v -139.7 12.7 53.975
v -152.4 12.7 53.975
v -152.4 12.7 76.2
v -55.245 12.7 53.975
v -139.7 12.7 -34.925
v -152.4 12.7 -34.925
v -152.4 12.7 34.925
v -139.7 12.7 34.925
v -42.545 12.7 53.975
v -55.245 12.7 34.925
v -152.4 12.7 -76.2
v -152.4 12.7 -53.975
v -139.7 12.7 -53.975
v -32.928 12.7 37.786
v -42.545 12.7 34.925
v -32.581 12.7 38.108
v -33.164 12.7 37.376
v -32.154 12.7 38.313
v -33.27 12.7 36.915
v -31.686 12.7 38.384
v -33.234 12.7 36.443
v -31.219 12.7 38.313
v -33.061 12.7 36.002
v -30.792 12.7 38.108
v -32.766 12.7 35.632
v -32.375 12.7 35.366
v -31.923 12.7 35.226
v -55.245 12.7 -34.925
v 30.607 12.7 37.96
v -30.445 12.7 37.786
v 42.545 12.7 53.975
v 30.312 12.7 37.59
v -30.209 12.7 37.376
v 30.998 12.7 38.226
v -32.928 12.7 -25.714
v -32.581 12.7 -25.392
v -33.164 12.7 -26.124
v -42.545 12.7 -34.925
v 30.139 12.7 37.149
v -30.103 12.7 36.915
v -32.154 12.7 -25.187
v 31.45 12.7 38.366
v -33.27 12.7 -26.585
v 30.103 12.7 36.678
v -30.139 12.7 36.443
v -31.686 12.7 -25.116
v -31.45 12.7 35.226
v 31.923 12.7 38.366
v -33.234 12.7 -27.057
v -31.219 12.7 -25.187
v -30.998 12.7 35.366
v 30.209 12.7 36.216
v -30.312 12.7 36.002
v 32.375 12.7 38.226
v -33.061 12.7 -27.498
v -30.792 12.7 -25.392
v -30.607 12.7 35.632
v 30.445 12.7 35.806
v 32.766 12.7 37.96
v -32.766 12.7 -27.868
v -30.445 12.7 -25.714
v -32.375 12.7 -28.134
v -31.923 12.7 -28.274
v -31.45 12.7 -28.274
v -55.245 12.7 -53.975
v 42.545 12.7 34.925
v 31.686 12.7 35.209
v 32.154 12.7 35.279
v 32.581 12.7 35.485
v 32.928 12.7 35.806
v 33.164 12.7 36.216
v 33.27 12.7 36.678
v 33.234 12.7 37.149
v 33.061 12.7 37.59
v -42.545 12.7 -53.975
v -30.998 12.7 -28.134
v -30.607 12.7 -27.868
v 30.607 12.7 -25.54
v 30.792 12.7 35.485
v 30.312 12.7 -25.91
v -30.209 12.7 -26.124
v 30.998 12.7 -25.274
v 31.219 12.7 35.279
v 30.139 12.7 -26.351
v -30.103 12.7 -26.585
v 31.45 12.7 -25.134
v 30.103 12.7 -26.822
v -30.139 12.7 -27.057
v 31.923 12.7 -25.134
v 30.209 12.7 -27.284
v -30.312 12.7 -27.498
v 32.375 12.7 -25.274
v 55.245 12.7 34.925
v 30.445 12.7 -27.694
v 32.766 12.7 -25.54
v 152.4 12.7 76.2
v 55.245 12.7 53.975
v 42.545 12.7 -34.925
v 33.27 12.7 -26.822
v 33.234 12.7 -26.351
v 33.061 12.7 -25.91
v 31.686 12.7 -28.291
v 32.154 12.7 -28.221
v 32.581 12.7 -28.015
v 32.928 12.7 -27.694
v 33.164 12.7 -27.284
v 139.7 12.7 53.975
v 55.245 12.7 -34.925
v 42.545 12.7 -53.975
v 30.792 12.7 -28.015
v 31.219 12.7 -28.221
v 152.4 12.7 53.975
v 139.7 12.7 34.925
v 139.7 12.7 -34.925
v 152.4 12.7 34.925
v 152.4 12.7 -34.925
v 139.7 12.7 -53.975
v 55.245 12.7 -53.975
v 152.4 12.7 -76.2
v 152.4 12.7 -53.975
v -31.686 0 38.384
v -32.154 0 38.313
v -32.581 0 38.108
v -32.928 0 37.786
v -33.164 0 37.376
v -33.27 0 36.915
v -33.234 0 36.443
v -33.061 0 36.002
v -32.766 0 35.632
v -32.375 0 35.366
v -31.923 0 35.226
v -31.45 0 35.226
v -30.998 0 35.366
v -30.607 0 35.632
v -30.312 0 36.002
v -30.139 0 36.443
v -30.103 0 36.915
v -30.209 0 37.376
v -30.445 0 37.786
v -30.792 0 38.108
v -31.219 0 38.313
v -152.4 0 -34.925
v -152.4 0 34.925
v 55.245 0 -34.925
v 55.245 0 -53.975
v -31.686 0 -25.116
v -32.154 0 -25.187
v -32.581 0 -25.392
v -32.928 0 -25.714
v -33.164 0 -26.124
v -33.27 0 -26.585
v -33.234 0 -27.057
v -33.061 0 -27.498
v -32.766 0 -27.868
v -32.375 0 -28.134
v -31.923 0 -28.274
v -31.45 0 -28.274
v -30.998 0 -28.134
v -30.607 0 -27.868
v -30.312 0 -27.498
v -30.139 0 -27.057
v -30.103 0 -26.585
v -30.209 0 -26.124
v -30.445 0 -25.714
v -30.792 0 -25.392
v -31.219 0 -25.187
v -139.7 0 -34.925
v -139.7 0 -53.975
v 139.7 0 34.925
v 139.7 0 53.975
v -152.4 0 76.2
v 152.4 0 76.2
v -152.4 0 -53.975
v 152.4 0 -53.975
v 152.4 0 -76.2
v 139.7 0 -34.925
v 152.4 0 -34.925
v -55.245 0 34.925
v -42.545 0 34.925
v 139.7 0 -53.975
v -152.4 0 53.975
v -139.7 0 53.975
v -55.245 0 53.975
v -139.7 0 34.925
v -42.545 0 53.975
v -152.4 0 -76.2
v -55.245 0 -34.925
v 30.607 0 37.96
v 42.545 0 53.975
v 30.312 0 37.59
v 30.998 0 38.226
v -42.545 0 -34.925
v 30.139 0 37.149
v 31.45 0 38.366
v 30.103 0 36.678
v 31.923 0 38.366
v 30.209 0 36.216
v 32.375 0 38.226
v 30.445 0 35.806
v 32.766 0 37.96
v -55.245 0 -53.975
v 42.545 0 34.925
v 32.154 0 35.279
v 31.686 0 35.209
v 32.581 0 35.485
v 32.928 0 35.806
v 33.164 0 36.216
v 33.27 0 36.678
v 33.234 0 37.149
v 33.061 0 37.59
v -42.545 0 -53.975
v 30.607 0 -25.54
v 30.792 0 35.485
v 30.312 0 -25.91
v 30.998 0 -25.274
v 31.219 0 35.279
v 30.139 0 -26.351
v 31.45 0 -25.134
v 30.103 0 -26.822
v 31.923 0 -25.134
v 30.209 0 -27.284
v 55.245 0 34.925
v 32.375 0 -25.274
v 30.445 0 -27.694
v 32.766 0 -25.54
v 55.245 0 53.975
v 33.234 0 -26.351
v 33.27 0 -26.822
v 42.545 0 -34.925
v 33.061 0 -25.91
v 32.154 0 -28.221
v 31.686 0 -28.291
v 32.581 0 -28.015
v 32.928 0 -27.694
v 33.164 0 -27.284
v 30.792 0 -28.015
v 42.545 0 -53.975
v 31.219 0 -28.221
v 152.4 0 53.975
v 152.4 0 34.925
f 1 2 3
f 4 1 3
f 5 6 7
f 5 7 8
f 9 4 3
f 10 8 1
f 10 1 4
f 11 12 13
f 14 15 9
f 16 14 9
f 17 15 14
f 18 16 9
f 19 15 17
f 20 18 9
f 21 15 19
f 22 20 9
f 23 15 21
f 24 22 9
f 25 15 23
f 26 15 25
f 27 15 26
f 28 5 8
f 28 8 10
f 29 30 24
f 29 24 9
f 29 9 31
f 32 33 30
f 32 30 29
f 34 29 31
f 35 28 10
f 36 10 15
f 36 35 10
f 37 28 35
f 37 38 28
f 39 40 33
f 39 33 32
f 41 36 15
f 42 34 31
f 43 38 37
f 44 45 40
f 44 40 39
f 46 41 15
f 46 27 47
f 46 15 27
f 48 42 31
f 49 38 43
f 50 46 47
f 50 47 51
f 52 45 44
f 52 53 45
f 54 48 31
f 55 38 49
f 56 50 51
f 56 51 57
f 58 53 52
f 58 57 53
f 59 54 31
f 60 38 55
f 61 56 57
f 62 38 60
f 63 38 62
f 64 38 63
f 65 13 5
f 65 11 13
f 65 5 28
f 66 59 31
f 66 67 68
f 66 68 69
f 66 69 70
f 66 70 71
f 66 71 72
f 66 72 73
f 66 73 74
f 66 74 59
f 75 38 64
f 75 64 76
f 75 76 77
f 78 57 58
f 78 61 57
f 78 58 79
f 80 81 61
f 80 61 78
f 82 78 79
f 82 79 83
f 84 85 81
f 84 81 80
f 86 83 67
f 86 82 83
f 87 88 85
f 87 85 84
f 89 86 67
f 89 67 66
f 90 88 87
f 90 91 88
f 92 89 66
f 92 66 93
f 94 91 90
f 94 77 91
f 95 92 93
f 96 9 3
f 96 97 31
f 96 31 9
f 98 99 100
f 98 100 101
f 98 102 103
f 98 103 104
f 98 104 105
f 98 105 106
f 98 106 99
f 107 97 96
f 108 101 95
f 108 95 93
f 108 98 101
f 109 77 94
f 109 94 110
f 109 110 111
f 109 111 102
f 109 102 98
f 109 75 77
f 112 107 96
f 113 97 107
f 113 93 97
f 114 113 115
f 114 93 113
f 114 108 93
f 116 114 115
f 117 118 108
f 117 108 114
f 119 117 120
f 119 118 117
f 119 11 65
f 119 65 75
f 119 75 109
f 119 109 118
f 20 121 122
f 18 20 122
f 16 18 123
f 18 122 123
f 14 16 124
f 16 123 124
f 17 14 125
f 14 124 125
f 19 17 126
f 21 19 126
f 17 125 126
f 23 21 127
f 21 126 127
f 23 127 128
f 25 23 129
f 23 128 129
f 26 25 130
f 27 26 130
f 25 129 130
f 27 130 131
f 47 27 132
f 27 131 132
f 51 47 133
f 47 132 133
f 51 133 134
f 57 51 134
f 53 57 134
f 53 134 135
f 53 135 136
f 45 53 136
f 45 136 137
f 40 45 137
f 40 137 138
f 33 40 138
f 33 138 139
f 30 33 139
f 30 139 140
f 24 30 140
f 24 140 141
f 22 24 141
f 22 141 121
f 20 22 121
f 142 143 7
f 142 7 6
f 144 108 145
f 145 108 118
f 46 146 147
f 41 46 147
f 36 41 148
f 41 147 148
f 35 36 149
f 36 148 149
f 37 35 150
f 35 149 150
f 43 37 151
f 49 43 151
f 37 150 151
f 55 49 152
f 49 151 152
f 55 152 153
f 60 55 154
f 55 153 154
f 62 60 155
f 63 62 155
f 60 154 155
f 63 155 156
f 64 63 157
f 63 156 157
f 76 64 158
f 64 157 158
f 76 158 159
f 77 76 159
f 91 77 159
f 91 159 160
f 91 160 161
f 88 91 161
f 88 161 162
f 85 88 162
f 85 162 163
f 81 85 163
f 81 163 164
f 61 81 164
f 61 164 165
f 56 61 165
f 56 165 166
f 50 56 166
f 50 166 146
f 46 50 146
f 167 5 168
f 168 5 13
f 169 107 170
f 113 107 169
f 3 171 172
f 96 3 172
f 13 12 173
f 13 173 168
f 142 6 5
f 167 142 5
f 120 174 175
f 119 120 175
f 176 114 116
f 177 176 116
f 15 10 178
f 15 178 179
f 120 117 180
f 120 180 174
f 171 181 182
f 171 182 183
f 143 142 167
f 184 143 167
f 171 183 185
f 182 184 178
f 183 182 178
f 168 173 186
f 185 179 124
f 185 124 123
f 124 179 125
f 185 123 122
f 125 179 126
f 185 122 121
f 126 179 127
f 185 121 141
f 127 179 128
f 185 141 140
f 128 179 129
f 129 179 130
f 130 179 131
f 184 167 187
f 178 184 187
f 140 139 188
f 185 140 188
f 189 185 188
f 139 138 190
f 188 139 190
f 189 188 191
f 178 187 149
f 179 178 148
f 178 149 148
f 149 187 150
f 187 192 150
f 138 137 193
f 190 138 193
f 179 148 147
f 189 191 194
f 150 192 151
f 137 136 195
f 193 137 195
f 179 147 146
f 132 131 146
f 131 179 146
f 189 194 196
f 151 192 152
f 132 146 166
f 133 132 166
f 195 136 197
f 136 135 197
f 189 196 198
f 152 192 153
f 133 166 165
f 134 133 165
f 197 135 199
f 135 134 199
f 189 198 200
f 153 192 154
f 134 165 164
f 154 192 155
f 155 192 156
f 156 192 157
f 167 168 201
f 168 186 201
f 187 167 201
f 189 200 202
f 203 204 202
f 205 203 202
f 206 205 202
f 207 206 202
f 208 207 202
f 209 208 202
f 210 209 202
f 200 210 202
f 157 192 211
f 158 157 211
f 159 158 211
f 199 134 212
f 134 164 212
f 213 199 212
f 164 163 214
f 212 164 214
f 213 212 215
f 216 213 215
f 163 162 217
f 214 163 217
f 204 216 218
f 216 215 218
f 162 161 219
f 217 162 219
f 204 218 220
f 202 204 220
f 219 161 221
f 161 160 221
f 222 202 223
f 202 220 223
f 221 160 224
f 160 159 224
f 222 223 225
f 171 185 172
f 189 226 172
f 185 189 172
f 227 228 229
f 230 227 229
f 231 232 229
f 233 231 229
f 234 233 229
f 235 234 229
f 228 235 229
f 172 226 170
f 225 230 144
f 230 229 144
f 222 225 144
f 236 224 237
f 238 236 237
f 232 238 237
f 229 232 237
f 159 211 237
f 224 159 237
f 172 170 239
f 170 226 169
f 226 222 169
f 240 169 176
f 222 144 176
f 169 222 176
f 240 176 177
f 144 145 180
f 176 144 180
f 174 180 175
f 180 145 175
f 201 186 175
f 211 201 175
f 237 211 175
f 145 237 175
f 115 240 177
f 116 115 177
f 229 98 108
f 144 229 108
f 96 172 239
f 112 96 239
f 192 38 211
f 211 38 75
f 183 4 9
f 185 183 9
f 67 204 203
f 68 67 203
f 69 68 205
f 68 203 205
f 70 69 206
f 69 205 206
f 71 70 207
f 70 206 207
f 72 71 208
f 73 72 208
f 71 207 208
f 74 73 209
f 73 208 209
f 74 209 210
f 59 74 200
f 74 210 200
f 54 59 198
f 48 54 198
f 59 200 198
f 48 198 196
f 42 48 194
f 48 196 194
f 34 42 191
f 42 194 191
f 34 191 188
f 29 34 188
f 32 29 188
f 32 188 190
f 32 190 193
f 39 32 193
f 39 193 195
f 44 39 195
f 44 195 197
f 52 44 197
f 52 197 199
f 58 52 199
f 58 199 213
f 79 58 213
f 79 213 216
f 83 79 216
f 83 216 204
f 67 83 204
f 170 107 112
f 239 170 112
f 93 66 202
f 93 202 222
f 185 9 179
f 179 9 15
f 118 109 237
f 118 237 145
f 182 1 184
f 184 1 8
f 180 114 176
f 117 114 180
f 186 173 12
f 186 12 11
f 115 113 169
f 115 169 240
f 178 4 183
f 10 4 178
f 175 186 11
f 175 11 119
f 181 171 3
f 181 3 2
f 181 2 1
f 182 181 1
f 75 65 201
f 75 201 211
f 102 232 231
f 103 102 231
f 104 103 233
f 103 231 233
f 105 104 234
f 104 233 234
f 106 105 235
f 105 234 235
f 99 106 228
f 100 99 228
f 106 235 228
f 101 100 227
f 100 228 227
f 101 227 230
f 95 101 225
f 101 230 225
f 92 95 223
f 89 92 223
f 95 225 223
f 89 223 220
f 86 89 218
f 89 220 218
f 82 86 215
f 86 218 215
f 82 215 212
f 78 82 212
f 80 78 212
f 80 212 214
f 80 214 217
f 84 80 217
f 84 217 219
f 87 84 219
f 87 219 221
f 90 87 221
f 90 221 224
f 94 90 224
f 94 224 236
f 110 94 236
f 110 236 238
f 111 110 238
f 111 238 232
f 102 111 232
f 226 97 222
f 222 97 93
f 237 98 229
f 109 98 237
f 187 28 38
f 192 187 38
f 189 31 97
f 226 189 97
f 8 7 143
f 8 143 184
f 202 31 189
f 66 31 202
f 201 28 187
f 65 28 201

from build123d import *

# Parameters (mm, degrees)
SKETCH1_W          = 304.8
SKETCH1_H          = 152.4
EXTRUDE1_DEPTH     = 12.7
SKETCH2_W          = 12.7
SKETCH2_H          = 19.05
EXTRUDE2_DEPTH     = 171.861025398
SKETCH3_R          = 1.5875
CUT_EXTRUDE1_DEPTH = 171.861025398


with BuildPart() as part:
    # Sketch1 → Extrude1 (new body)
    with BuildSketch(Plane(origin=(0, 0, 0), x_dir=(1, 0, 0), z_dir=(0, 1, 0))):
        Rectangle(SKETCH1_W, SKETCH1_H)
    extrude(amount=EXTRUDE1_DEPTH)

    # Sketch2 → Extrude2 (cut, through all)
    with BuildSketch(Plane(origin=(0, 12.7, 0), x_dir=(1, 0, 0), z_dir=(0, 1, 0))):
        with Locations((-48.895, 44.45)):
            Rectangle(SKETCH2_W, SKETCH2_H)
        with Locations((48.895, 44.45)):
            Rectangle(SKETCH2_W, SKETCH2_H)
        with Locations((-48.895, -44.45)):
            Rectangle(SKETCH2_W, SKETCH2_H)
        with Locations((48.895, -44.45)):
            Rectangle(SKETCH2_W, SKETCH2_H)
        with Locations((146.05, 44.45)):
            Rectangle(SKETCH2_W, SKETCH2_H)
        with Locations((-146.05, 44.45)):
            Rectangle(SKETCH2_W, SKETCH2_H)
        with Locations((146.05, -44.45)):
            Rectangle(SKETCH2_W, SKETCH2_H)
        with Locations((-146.05, -44.45)):
            Rectangle(SKETCH2_W, SKETCH2_H)
    extrude(amount=-EXTRUDE2_DEPTH, mode=Mode.SUBTRACT)

    # Sketch3 → Cut-Extrude1 (cut, through all)
    with BuildSketch(Plane.XZ):
        with Locations(Location((31.6865, 36.796180661, 0), (0, 0, 270))):
            Circle(SKETCH3_R)
        with Locations(Location((31.6865, -26.703819339, 0), (0, 0, 270))):
            Circle(SKETCH3_R)
        with Locations(Location((-31.6865, -26.703819339, 0), (0, 0, 90))):
            Circle(SKETCH3_R)
        with Locations(Location((-31.6865, 36.796180661, 0), (0, 0, 90))):
            Circle(SKETCH3_R)
    extrude(amount=-CUT_EXTRUDE1_DEPTH, mode=Mode.SUBTRACT)


solid = part.part
